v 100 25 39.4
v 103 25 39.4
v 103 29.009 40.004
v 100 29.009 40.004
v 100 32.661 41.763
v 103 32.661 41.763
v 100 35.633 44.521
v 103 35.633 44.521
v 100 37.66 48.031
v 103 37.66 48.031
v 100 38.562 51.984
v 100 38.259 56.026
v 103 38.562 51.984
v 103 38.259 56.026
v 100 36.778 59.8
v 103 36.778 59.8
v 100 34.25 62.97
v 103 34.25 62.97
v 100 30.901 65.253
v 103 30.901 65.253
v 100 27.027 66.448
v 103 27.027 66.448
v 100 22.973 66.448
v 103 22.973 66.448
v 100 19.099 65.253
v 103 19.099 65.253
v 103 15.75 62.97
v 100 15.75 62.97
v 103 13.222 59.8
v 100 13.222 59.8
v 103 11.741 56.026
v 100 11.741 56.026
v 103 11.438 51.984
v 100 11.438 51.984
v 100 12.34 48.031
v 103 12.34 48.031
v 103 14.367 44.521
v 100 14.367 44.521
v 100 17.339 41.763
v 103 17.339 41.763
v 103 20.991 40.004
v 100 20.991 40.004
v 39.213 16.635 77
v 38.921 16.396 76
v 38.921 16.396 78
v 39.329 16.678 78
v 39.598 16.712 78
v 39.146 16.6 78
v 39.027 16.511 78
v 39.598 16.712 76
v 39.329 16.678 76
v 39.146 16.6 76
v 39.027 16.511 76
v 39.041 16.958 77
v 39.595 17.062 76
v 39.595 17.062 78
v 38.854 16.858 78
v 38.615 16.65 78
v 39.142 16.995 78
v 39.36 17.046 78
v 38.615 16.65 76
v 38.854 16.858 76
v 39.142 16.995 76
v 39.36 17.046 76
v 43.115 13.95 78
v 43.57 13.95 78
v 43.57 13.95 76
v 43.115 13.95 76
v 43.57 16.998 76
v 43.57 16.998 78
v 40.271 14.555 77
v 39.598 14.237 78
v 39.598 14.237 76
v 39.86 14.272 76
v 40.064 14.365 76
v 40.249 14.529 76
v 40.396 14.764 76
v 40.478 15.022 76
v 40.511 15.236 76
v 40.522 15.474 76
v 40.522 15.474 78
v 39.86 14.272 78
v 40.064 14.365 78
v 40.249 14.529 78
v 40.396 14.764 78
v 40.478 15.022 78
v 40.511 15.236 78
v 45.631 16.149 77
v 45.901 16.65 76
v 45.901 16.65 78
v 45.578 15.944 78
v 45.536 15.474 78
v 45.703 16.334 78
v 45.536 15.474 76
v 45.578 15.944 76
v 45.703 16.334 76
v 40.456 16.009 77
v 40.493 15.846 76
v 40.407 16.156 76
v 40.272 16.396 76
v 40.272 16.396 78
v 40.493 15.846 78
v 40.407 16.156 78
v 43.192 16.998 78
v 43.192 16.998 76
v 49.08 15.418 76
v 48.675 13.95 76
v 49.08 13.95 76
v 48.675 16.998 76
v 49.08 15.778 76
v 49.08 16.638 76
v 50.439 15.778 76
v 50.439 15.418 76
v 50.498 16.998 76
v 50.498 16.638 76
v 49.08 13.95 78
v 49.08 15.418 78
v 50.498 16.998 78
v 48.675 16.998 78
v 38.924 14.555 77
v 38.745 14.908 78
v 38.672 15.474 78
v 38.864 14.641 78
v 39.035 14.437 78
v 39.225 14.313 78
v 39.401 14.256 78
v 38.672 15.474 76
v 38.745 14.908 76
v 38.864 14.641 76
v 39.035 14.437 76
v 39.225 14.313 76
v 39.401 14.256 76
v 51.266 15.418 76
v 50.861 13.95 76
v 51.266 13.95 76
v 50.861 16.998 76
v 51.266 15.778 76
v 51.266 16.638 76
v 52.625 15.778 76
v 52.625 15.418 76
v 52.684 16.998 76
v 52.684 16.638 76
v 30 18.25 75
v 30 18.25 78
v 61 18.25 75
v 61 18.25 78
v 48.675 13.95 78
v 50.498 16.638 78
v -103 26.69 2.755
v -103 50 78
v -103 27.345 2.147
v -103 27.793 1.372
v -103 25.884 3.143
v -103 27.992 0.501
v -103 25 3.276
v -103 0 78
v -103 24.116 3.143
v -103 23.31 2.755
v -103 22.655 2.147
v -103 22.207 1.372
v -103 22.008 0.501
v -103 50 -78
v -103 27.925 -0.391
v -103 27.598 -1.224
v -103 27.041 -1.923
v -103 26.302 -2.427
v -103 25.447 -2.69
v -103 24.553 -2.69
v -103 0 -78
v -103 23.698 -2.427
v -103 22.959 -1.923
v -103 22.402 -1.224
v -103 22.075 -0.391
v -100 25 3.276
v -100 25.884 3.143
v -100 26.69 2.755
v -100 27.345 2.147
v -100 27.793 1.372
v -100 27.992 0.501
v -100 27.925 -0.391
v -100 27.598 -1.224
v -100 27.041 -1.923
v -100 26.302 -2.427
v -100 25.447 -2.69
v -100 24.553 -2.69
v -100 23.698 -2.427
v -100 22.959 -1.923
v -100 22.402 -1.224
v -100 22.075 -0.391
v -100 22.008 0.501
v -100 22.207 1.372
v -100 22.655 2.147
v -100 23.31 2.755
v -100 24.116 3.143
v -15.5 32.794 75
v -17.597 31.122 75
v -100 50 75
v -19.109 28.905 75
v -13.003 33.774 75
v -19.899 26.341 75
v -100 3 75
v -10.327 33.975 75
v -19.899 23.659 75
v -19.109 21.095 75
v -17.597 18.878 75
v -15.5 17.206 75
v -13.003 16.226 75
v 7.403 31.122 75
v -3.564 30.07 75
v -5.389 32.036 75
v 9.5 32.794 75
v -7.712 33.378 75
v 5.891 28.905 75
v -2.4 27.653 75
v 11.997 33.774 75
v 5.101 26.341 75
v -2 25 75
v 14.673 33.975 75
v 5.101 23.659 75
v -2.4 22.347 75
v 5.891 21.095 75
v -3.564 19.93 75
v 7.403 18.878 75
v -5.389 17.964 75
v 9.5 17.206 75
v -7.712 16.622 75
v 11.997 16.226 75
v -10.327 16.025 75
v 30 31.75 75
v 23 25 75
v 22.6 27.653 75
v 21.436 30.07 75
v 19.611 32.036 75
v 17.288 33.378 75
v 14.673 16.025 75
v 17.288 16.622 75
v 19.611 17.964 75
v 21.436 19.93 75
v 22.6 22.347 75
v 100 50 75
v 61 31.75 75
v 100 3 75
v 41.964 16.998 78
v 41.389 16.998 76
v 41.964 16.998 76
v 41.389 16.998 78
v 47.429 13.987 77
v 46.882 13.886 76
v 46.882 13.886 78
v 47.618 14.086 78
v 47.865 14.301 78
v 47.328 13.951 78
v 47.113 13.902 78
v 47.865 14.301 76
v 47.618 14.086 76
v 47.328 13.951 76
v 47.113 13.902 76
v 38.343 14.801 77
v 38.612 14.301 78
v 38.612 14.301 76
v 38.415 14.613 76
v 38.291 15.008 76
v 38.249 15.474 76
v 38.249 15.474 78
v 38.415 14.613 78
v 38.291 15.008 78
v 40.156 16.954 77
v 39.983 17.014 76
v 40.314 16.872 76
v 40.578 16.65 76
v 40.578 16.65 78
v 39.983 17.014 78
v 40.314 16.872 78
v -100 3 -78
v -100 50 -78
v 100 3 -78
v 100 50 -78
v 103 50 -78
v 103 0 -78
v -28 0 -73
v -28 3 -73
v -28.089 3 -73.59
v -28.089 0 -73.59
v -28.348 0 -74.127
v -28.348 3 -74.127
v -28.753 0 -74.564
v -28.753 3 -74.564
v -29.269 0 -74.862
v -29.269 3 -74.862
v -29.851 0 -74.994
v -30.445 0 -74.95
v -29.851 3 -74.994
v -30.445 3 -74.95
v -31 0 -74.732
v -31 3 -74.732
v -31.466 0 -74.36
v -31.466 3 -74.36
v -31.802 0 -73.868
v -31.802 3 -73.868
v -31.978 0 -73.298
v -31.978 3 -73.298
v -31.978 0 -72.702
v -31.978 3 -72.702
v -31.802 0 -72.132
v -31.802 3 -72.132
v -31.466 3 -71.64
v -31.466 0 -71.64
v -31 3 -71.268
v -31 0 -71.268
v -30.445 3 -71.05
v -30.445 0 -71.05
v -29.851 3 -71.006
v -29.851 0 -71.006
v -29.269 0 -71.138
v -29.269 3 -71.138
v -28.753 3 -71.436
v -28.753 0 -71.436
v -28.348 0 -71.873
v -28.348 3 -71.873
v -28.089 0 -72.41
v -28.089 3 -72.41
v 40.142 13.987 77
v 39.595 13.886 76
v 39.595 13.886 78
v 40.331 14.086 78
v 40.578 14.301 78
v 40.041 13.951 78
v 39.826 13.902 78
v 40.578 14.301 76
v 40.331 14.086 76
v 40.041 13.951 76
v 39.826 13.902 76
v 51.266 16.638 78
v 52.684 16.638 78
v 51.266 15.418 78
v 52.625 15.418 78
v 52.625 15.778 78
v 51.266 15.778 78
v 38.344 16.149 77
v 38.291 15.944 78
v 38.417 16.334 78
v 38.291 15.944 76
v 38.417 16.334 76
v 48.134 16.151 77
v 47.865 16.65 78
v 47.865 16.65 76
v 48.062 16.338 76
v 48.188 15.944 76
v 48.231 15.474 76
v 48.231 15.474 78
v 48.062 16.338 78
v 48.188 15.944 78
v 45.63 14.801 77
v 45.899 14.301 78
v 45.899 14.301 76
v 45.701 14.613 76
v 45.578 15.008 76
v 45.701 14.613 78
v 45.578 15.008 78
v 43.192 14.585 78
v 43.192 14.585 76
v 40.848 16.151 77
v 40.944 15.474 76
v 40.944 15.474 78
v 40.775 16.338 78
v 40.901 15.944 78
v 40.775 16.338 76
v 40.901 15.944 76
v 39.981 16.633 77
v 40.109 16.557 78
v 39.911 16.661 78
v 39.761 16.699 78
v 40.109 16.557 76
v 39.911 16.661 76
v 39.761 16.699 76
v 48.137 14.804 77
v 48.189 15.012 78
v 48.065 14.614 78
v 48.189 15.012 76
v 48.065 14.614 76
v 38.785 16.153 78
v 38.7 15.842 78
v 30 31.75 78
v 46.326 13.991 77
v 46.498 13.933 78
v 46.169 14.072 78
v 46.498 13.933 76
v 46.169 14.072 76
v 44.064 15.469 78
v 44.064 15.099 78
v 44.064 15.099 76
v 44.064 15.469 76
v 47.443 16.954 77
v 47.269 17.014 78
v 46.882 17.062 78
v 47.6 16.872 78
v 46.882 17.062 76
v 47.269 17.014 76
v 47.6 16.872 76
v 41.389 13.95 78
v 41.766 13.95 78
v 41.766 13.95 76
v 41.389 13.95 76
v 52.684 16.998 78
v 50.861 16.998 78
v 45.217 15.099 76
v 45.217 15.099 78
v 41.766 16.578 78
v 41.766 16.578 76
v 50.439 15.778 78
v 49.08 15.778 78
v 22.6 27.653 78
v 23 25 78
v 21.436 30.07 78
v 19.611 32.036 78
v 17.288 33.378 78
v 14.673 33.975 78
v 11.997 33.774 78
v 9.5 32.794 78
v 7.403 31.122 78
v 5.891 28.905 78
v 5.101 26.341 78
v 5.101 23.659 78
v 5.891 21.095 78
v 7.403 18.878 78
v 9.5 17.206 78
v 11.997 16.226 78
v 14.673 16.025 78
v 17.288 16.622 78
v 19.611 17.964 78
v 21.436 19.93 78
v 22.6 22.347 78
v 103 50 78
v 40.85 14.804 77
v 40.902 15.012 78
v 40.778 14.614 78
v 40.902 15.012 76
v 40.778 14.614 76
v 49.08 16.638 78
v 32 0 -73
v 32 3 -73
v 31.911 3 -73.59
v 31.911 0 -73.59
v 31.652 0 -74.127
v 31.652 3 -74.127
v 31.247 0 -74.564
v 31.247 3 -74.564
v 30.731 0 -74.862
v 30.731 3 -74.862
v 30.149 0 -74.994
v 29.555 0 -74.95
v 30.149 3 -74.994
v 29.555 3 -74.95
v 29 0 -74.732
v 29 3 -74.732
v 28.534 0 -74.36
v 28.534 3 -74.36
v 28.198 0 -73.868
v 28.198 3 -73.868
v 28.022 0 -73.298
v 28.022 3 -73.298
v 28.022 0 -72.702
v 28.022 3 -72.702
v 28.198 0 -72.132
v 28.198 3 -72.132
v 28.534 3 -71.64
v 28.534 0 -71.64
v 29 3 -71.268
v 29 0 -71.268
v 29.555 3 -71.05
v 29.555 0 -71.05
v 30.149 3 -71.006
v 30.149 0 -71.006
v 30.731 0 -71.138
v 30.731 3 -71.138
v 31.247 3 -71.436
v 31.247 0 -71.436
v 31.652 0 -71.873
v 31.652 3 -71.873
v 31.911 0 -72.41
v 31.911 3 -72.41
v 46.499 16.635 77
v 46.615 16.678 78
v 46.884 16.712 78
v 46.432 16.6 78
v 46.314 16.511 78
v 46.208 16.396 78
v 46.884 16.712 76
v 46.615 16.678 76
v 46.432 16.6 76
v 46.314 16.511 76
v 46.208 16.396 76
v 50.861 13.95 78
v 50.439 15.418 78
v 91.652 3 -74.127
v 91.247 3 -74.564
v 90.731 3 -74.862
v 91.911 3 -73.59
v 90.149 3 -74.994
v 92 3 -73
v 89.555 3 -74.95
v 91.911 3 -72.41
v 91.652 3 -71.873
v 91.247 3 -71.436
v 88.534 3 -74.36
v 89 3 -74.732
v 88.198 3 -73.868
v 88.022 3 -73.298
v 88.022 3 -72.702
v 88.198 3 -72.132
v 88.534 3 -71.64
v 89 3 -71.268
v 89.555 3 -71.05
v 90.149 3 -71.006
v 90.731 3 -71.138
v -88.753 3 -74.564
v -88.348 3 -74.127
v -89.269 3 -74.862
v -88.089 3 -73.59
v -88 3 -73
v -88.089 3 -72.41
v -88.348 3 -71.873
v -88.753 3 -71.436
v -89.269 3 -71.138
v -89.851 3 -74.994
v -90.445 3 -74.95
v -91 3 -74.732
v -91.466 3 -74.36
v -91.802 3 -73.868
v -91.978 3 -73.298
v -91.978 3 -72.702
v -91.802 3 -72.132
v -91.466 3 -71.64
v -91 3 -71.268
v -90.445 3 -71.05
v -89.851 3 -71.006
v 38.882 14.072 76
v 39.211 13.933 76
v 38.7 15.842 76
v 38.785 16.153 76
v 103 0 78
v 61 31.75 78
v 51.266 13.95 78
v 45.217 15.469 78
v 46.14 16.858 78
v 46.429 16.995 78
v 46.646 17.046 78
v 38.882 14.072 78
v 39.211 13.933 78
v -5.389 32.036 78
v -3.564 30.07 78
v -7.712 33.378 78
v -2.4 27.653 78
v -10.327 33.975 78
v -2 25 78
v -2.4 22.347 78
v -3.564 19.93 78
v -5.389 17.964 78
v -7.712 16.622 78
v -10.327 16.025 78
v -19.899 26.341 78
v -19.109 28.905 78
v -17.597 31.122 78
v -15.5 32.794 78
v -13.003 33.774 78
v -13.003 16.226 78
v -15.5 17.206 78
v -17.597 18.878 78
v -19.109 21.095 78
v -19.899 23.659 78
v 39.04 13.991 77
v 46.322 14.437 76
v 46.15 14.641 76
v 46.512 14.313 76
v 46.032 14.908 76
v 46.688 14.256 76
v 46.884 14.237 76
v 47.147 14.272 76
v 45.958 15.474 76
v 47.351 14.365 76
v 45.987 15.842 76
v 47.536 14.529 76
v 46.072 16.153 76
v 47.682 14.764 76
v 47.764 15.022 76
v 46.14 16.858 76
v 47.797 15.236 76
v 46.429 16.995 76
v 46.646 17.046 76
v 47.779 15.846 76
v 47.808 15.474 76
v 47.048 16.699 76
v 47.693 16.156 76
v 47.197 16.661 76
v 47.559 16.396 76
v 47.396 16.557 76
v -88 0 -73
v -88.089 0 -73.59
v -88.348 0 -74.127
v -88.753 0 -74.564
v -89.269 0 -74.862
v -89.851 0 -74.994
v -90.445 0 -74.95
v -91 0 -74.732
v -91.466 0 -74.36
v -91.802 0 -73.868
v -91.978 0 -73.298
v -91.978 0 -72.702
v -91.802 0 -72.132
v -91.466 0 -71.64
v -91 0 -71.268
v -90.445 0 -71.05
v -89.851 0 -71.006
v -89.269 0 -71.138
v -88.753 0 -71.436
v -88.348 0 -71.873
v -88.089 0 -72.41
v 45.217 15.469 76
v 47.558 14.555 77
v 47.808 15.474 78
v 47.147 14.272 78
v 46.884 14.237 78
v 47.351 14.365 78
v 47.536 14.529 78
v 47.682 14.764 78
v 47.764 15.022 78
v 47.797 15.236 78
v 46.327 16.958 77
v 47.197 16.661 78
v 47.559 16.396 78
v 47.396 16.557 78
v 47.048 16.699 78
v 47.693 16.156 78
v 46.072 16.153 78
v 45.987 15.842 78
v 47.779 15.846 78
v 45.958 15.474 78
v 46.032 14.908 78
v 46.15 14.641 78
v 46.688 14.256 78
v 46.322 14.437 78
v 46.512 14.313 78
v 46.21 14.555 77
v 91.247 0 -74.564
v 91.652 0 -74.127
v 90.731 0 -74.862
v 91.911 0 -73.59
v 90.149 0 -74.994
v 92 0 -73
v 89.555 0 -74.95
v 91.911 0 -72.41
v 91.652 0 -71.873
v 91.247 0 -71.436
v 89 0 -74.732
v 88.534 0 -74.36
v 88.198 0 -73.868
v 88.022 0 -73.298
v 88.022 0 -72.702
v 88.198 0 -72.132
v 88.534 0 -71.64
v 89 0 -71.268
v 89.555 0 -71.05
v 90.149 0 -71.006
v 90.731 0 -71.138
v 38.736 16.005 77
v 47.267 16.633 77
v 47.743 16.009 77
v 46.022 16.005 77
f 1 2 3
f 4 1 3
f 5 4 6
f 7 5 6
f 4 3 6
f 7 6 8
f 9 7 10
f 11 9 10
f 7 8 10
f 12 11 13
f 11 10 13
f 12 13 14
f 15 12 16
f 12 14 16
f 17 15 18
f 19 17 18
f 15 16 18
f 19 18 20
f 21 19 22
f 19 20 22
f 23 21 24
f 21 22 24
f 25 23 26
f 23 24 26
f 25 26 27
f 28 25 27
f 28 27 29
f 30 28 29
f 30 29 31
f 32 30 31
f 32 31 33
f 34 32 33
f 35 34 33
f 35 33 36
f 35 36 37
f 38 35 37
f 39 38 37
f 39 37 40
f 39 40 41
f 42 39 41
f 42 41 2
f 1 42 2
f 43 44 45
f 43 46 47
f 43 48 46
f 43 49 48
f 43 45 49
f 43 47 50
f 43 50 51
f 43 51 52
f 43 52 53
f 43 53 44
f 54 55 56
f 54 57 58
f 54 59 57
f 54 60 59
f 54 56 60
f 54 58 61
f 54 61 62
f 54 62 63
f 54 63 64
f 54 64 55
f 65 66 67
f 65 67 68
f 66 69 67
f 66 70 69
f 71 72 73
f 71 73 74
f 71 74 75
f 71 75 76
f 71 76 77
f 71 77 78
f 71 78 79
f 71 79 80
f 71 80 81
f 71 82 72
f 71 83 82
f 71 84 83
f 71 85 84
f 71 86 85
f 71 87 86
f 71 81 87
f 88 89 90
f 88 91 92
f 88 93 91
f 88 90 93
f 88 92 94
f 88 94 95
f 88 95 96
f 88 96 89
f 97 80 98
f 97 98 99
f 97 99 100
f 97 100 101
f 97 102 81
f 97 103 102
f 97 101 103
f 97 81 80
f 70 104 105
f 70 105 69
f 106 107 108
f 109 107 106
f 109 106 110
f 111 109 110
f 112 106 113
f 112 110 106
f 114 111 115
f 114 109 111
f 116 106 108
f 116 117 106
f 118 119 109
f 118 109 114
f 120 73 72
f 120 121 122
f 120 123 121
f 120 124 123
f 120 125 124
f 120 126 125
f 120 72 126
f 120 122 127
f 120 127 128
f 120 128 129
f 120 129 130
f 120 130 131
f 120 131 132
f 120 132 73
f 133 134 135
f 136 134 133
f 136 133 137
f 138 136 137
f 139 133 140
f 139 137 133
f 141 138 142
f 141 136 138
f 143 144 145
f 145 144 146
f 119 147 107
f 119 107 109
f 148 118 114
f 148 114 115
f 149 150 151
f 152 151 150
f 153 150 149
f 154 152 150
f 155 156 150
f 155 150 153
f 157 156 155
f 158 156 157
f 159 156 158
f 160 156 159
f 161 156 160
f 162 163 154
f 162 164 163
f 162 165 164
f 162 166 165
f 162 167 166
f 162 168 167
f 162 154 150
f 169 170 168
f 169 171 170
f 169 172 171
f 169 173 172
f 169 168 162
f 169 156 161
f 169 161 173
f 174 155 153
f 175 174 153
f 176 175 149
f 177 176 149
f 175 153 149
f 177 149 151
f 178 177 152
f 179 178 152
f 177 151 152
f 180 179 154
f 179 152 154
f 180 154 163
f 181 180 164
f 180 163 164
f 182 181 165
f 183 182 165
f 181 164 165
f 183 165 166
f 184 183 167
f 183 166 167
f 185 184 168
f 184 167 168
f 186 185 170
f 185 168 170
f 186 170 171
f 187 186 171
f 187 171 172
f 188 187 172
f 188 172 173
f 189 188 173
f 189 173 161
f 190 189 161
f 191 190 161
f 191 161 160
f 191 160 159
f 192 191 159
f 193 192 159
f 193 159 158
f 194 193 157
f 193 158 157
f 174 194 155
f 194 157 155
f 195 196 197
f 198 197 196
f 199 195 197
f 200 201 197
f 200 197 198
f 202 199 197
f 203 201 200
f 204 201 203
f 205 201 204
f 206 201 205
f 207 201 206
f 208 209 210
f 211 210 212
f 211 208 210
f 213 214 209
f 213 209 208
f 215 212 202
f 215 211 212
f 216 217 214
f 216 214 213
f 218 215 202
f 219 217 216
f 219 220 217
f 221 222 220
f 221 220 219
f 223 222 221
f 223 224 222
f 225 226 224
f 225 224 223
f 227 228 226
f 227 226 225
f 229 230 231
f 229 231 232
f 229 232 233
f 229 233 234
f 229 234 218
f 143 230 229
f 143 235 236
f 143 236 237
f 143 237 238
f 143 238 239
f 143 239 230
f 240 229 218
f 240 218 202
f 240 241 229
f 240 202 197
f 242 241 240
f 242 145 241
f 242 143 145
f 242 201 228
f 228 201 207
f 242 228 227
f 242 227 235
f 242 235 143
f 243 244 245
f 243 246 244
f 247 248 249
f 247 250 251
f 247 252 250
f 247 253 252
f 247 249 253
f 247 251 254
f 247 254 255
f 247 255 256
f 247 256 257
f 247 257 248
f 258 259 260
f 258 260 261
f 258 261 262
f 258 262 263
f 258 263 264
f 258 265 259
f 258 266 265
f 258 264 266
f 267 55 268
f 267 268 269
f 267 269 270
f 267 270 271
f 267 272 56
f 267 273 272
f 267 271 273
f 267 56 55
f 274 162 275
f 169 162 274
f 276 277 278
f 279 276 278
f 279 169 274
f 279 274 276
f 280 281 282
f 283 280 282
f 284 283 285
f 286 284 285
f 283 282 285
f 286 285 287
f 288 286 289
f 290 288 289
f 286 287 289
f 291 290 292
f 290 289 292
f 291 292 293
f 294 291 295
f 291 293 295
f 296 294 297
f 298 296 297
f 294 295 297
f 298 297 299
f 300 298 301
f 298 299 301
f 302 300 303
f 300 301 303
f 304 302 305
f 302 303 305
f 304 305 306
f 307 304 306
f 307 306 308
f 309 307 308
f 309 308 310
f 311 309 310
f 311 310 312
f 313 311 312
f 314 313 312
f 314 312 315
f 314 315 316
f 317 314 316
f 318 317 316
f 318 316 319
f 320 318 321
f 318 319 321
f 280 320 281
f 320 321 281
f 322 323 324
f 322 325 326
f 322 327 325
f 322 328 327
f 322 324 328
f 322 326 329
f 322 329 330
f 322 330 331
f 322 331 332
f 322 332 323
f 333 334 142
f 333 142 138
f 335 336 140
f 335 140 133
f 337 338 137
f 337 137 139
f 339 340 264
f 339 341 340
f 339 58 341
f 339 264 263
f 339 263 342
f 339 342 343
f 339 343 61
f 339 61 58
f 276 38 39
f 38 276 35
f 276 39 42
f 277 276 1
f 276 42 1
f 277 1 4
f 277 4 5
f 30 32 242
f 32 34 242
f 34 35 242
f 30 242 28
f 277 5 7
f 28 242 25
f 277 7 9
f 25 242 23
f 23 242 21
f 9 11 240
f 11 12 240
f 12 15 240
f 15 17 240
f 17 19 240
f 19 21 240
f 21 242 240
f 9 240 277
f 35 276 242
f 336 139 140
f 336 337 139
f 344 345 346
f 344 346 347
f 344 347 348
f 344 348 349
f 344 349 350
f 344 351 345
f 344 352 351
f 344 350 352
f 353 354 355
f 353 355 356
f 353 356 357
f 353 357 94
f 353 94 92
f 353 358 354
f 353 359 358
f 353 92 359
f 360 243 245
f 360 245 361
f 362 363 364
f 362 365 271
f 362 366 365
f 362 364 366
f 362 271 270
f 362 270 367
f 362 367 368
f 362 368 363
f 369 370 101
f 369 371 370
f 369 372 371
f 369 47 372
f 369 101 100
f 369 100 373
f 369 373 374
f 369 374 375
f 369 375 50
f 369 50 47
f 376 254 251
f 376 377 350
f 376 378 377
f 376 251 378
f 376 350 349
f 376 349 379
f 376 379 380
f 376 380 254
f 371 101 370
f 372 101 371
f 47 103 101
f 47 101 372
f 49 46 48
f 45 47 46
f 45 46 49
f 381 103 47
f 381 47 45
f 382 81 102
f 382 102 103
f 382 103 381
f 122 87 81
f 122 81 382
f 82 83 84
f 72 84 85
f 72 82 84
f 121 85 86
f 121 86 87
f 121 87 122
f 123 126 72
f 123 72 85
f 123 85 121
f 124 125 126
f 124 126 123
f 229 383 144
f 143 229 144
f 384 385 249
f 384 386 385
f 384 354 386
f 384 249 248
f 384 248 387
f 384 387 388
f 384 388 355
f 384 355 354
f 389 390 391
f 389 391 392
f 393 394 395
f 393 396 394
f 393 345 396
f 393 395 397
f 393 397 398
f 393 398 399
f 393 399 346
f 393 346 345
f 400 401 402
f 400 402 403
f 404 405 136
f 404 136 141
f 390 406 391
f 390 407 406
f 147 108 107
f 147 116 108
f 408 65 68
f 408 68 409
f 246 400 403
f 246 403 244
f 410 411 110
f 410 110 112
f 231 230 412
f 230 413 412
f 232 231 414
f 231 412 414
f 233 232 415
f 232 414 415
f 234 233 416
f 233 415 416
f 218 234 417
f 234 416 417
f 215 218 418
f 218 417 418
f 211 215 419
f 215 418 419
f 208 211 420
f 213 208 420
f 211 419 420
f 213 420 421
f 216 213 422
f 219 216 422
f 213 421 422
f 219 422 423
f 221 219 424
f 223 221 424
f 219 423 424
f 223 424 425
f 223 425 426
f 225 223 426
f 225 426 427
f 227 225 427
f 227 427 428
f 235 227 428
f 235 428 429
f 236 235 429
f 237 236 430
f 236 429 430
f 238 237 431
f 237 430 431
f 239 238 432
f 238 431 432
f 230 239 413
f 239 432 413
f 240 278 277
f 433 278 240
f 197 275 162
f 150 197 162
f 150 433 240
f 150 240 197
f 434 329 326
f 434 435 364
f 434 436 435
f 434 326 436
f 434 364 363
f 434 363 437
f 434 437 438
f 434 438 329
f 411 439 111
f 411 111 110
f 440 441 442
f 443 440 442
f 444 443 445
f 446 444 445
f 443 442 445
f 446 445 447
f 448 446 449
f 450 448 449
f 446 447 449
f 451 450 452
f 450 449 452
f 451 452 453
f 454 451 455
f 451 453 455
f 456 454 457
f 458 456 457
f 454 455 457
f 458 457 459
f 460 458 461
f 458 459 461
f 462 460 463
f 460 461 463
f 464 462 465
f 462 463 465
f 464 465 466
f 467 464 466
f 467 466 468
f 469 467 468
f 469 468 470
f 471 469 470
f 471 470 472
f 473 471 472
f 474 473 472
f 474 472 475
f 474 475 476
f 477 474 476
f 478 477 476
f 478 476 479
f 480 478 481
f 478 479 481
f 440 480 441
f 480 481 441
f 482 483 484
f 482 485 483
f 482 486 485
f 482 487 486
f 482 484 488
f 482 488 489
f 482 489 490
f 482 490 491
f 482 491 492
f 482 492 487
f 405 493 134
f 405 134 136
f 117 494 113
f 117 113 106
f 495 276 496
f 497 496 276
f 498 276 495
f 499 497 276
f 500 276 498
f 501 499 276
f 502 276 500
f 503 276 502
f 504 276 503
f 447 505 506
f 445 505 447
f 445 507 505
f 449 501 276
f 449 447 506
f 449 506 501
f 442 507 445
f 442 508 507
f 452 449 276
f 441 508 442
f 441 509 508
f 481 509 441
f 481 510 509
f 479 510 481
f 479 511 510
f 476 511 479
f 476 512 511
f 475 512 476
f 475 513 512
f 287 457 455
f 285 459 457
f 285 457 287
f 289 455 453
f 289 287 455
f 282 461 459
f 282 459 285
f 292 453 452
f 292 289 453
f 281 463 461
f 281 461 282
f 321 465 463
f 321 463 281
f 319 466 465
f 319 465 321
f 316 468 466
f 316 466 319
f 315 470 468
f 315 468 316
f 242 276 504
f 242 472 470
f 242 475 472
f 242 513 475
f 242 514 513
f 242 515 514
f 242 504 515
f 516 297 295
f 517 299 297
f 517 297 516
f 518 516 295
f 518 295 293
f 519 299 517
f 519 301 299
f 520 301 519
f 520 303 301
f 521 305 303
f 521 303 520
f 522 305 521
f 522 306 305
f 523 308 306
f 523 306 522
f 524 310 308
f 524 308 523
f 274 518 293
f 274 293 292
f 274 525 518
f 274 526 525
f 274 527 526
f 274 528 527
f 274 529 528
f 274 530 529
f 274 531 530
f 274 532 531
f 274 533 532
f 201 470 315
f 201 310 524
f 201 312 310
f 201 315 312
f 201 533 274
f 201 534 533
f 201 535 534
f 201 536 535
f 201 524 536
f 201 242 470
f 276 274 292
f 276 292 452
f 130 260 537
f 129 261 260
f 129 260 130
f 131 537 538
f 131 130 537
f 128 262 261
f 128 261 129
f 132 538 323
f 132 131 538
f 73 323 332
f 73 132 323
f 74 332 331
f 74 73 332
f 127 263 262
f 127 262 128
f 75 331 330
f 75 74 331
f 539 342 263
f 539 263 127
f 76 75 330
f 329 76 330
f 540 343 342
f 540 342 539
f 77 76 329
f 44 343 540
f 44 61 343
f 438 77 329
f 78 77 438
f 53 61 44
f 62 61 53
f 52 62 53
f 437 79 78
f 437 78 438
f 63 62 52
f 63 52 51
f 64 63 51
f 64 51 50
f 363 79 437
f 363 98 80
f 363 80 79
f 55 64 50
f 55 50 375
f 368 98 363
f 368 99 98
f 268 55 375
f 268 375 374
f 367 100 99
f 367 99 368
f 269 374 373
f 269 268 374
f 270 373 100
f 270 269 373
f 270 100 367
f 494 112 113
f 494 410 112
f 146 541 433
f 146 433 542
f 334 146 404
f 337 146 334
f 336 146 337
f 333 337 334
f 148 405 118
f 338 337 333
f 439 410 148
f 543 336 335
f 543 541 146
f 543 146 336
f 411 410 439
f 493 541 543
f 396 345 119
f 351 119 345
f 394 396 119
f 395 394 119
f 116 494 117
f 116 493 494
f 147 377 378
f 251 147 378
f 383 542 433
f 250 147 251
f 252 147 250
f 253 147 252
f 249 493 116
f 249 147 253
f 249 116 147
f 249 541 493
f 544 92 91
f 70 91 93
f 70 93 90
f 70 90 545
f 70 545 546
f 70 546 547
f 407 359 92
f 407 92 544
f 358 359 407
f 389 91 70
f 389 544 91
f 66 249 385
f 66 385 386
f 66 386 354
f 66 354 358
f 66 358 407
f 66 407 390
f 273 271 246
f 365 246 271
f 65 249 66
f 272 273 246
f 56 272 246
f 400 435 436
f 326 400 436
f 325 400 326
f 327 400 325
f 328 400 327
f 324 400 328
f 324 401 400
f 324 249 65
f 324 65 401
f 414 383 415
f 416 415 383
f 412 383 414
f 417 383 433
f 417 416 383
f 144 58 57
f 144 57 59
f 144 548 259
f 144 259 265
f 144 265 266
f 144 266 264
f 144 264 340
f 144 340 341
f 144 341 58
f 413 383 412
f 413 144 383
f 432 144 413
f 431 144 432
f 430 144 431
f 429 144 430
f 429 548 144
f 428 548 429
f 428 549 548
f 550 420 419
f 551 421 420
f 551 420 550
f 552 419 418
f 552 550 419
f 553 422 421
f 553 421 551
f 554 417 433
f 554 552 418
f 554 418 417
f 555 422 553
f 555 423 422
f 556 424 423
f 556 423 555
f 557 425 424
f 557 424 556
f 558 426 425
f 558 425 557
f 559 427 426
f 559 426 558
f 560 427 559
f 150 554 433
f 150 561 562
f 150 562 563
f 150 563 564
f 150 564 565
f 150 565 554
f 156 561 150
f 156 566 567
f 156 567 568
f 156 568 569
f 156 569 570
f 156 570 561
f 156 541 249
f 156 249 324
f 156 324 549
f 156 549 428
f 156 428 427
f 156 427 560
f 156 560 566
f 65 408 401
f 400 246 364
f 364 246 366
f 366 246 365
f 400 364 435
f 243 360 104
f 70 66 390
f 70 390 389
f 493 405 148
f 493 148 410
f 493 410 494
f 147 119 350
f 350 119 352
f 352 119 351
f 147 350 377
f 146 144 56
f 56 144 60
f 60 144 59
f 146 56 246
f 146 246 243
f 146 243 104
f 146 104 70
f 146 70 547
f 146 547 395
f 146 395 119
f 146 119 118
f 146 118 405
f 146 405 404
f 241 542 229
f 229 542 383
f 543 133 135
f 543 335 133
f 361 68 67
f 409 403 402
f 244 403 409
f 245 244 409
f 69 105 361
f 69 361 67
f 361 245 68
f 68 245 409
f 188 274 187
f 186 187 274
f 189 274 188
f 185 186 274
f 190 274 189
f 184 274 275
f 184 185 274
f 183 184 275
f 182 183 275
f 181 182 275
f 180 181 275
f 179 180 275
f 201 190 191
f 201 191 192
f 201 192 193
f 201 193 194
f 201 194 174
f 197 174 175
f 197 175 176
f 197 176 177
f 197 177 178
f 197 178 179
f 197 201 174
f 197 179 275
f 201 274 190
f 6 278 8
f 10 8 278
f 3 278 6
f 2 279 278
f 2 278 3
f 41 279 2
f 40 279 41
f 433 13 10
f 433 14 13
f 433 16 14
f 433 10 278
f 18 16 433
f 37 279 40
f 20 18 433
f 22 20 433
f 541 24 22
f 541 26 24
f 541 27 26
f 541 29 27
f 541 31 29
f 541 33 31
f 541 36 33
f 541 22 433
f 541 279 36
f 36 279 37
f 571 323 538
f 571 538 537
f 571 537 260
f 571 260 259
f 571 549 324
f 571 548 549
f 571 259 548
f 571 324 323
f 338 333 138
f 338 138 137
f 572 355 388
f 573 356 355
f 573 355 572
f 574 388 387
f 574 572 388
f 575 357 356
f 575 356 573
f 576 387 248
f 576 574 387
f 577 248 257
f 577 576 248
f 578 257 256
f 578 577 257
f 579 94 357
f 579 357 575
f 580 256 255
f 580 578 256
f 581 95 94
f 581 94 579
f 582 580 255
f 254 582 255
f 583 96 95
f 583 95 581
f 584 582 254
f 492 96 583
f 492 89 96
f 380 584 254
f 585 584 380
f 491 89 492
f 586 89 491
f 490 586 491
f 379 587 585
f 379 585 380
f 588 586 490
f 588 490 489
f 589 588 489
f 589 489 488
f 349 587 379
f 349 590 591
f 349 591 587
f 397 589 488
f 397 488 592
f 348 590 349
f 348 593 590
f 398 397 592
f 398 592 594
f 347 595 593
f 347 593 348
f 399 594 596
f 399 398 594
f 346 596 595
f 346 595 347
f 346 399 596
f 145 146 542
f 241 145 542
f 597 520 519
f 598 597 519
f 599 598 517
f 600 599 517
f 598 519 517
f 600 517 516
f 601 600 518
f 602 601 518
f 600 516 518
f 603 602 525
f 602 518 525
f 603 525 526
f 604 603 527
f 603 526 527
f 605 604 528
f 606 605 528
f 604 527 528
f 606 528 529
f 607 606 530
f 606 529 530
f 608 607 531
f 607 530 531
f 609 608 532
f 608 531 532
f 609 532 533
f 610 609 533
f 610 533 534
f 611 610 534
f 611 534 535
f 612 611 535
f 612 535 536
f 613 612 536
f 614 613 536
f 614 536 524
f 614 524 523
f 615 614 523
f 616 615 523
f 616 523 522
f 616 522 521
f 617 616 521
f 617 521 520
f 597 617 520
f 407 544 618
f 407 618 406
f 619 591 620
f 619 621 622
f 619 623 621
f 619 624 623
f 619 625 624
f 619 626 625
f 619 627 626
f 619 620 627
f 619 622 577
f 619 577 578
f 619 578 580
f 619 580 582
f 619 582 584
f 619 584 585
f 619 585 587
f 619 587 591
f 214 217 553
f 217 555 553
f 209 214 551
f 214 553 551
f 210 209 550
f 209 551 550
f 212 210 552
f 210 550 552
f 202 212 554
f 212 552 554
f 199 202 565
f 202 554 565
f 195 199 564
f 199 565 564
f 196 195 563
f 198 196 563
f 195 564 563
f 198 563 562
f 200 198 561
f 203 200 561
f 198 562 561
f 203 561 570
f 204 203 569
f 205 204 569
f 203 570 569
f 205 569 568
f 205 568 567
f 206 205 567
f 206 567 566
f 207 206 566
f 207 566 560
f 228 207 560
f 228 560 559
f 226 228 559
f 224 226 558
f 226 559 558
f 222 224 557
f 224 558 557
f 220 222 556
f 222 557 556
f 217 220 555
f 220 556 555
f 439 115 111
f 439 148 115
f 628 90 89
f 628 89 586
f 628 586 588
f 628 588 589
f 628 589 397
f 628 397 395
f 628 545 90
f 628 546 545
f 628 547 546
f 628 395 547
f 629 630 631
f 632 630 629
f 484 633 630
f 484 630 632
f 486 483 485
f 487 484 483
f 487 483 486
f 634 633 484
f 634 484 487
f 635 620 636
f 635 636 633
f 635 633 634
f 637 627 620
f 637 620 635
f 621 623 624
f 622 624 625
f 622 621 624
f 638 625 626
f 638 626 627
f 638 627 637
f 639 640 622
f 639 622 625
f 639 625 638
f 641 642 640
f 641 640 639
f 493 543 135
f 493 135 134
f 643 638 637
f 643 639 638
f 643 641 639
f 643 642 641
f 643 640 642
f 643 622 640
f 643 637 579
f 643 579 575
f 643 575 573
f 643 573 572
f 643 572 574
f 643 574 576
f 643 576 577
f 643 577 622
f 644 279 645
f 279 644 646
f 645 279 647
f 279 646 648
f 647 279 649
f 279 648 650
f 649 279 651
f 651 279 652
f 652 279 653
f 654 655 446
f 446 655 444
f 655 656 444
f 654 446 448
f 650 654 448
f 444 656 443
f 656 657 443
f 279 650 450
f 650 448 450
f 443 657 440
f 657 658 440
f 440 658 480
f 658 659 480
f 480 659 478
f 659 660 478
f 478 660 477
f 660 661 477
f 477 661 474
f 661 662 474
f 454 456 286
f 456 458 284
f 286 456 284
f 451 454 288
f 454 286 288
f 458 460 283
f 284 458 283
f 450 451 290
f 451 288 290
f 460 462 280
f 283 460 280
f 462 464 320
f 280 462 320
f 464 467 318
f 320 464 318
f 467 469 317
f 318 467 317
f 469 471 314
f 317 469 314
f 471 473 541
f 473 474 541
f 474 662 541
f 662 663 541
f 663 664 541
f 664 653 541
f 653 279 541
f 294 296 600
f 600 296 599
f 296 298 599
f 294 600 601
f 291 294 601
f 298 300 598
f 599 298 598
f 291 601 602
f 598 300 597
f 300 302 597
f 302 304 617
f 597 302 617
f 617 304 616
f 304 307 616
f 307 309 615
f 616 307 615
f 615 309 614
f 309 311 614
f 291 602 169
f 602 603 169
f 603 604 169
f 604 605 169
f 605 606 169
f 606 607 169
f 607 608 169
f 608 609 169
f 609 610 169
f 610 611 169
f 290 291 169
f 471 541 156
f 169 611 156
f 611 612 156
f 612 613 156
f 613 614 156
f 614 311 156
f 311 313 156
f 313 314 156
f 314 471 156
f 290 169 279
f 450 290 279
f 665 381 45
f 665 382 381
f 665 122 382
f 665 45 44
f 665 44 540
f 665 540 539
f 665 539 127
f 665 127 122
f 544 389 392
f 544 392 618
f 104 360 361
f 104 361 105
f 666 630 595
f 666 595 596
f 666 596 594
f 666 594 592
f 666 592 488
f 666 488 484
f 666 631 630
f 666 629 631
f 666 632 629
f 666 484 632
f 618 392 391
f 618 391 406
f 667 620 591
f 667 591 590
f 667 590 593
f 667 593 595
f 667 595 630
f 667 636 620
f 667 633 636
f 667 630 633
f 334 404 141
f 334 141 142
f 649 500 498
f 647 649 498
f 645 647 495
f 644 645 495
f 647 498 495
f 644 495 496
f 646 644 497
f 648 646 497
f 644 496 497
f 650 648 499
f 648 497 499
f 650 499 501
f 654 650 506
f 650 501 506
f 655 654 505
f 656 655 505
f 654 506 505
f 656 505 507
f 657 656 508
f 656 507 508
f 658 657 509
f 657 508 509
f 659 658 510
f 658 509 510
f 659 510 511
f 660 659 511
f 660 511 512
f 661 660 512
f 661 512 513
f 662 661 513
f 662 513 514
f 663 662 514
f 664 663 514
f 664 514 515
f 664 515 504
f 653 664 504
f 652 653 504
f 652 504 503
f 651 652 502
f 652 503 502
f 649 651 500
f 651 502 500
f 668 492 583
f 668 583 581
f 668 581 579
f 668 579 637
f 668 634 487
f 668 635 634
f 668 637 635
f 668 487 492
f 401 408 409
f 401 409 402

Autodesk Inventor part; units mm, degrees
ref_plane "YZ Plane" through (0, 0, 0) normal (1, 0, 0) x (0, 1, 0)
ref_plane "XZ Plane" through (0, 0, 0) normal (0, 1, 0) x (-1, 0, 0)
ref_plane "XY Plane" through (0, 0, 0) normal (0, 0, 1) x (1, 0, 0)
sketch "Boceto1" plane through (0, 0, 0) normal (0, 1, 0) x (-1, 0, 0)
  line L0 (-100, 75) -> (100, 75)
  line L1 (100, 75) -> (100, -75)
  line L2 (100, -75) -> (-100, -75)
  line L3 (-100, -75) -> (-100, 75)
  line L4 (-100, 75) -> (100, -75) construction
  line L5 (100, 75) -> (-100, -75) construction
  point P0 (0, 0)
  dimension "d0" = 200
  dimension "d1" = 150
extrude "Extrusión1" add sketch "Boceto1" along normal blind 3
sketch "Boceto2" plane through (0, 0, 0) normal (0, 1, 0) x (-1, 0, 0)
  line L0 (-100, -75) -> (100, -75) projected
  line L1 (100, -75) -> (100, 75) projected
  line L2 (100, 75) -> (-100, 75) projected
  line L3 (-100, 75) -> (-100, -75) projected
  line L4 (103, 78) -> (103, -78)
  line L5 (103, -78) -> (-103, -78)
  line L6 (-103, -78) -> (-103, 78)
  line L7 (-103, 78) -> (103, 78)
  point P0 (0, 0)
  dimension "d4" = 3
extrude "Extrusión2" add sketch "Boceto2" along normal blind 50
sketch "Boceto3" plane through (-103, 0, -78) normal (-1, 0, 0) x (0, 0, 1)
  line L0 (78, 0) -> (78, 50) construction
  line L1 (3, 50) -> (153, 50) construction
  line L2 (156, 0) -> (156, 50) construction
  line L3 (156, 25) -> (0.5528, 25) construction
  circle A0 centre (78.2764, 25) radius 3
  line L4 (0, 0) -> (156, 0) projected
  line L5 (156, 0) -> (156, 50) projected
  line L6 (0, 50) -> (156, 50) projected
  line L7 (0, 0) -> (0, 50) projected
  line L8 (0, 0) -> (156, 0) projected
  dimension "d7" = 6
  dimension "d11" = 25
extrude "Extrusión3" cut sketch "Boceto3" against normal blind 3 contours A0
sketch "Boceto4" plane through (-103, 0, 78) normal (0, 0, 1) x (1, 0, 0)
  line L0 (0, 0) -> (206, 0) projected
  line L1 (0, 25) -> (206, 25)
  circle A0 centre (92, 25) radius 9
  circle A1 centre (117, 25) radius 9
  line L2 (133, 18.25) -> (164, 18.25)
  line L3 (164, 18.25) -> (164, 31.75)
  line L4 (164, 31.75) -> (133, 31.75)
  line L5 (133, 31.75) -> (133, 18.25)
  line L6 (133, 18.25) -> (164, 31.75) construction
  line L7 (164, 18.25) -> (133, 31.75) construction
  line L8 (206, 0) -> (206, 50) projected
  line L9 (141.1134, 17.0625) -> (155.7384, 17.0625) construction
  line L10 (155.7384, 17.0625) -> (155.7384, 13.8861) construction
  line L11 (155.7384, 13.8861) -> (141.1134, 13.8861) construction
  line L12 (141.1134, 13.8861) -> (141.1134, 17.0625) construction
  spline S0 degree 2 poles (143.5785, 16.6501) (143.7514, 16.4475) (143.944, 15.8547) (143.944, 15.4743) knots 0 0 0 1 2 2 2
  spline S1 degree 2 poles (143.944, 15.4743) (143.944, 15.1038) (143.7563, 14.5036) (143.5785, 14.3011) knots 0 0 0 1 2 2 2
  spline S2 degree 2 poles (143.5785, 14.3011) (143.3907, 14.0886) (142.8943, 13.8861) (142.5954, 13.8861) knots 0 0 0 1 2 2 2
  spline S3 degree 2 poles (142.5954, 13.8861) (142.2866, 13.8861) (141.7926, 14.0961) (141.6123, 14.3011) knots 0 0 0 1 2 2 2
  spline S4 degree 2 poles (141.6123, 14.3011) (141.437, 14.5036) (141.2492, 15.0989) (141.2492, 15.4743) knots 0 0 0 1 2 2 2
  spline S5 degree 2 poles (141.2492, 15.4743) (141.2492, 15.8572) (141.4394, 16.4401) (141.6148, 16.6501) knots 0 0 0 1 2 2 2
  spline S6 degree 2 poles (141.6148, 16.6501) (141.7926, 16.8526) (142.2891, 17.0625) (142.5954, 17.0625) knots 0 0 0 1 2 2 2
  spline S7 degree 2 poles (142.5954, 17.0625) (142.9066, 17.0625) (143.4056, 16.8452) (143.5785, 16.6501) knots 0 0 0 1 2 2 2
  spline S8 degree 2 poles (143.5217, 15.4743) (143.5217, 15.7757) (143.3907, 16.2425) (143.2722, 16.3956) knots 0 0 0 1 2 2 2
  spline S9 degree 2 poles (143.2722, 16.3956) (143.1511, 16.5537) (142.8103, 16.7118) (142.5979, 16.7118) knots 0 0 0 1 2 2 2
  spline S10 degree 2 poles (142.5979, 16.7118) (142.378, 16.7118) (142.0471, 16.5587) (141.9211, 16.3956) knots 0 0 0 1 2 2 2
  spline S11 degree 2 poles (141.9211, 16.3956) (141.8, 16.24) (141.6716, 15.7707) (141.6716, 15.4743) knots 0 0 0 1 2 2 2
  spline S12 degree 2 poles (141.6716, 15.4743) (141.6716, 14.8741) (142.1755, 14.2368) (142.5979, 14.2368) knots 0 0 0 1 2 2 2
  spline S13 degree 2 poles (142.5979, 14.2368) (143.0202, 14.2368) (143.5217, 14.8741) (143.5217, 15.4743) knots 0 0 0 1 2 2 2
  line L13 (146.5697, 13.9503) -> (146.1152, 13.9503)
  line L14 (146.1152, 13.9503) -> (144.7665, 16.5784)
  line L15 (144.7665, 16.5784) -> (144.7665, 13.9503)
  line L16 (144.7665, 13.9503) -> (144.3886, 13.9503)
  line L17 (144.3886, 13.9503) -> (144.3886, 16.9983)
  line L18 (144.3886, 16.9983) -> (144.9641, 16.9983)
  line L19 (144.9641, 16.9983) -> (146.1917, 14.5851)
  line L20 (146.1917, 14.5851) -> (146.1917, 16.9983)
  line L21 (146.1917, 16.9983) -> (146.5697, 16.9983)
  line L22 (146.5697, 16.9983) -> (146.5697, 13.9503)
  line L23 (148.2172, 15.0989) -> (147.0637, 15.0989)
  line L24 (147.0637, 15.0989) -> (147.0637, 15.4694)
  line L25 (147.0637, 15.4694) -> (148.2172, 15.4694)
  line L26 (148.2172, 15.4694) -> (148.2172, 15.0989)
  spline S14 degree 2 poles (150.865, 16.6501) (151.0379, 16.4475) (151.2306, 15.8547) (151.2306, 15.4743) knots 0 0 0 1 2 2 2
  spline S15 degree 2 poles (151.2306, 15.4743) (151.2306, 15.1038) (151.0428, 14.5036) (150.865, 14.3011) knots 0 0 0 1 2 2 2
  spline S16 degree 2 poles (150.865, 14.3011) (150.6773, 14.0886) (150.1808, 13.8861) (149.8819, 13.8861) knots 0 0 0 1 2 2 2
  spline S17 degree 2 poles (149.8819, 13.8861) (149.5732, 13.8861) (149.0792, 14.0961) (148.8989, 14.3011) knots 0 0 0 1 2 2 2
  spline S18 degree 2 poles (148.8989, 14.3011) (148.7235, 14.5036) (148.5358, 15.0989) (148.5358, 15.4743) knots 0 0 0 1 2 2 2
  spline S19 degree 2 poles (148.5358, 15.4743) (148.5358, 15.8572) (148.726, 16.4401) (148.9013, 16.6501) knots 0 0 0 1 2 2 2
  spline S20 degree 2 poles (148.9013, 16.6501) (149.0792, 16.8526) (149.5757, 17.0625) (149.8819, 17.0625) knots 0 0 0 1 2 2 2
  spline S21 degree 2 poles (149.8819, 17.0625) (150.1932, 17.0625) (150.6921, 16.8452) (150.865, 16.6501) knots 0 0 0 1 2 2 2
  spline S22 degree 2 poles (150.8082, 15.4743) (150.8082, 15.7757) (150.6773, 16.2425) (150.5587, 16.3956) knots 0 0 0 1 2 2 2
  spline S23 degree 2 poles (150.5587, 16.3956) (150.4377, 16.5537) (150.0968, 16.7118) (149.8844, 16.7118) knots 0 0 0 1 2 2 2
  spline S24 degree 2 poles (149.8844, 16.7118) (149.6646, 16.7118) (149.3336, 16.5587) (149.2076, 16.3956) knots 0 0 0 1 2 2 2
  spline S25 degree 2 poles (149.2076, 16.3956) (149.0866, 16.24) (148.9582, 15.7707) (148.9582, 15.4743) knots 0 0 0 1 2 2 2
  spline S26 degree 2 poles (148.9582, 15.4743) (148.9582, 14.8741) (149.462, 14.2368) (149.8844, 14.2368) knots 0 0 0 1 2 2 2
  spline S27 degree 2 poles (149.8844, 14.2368) (150.3068, 14.2368) (150.8082, 14.8741) (150.8082, 15.4743) knots 0 0 0 1 2 2 2
  line L27 (153.498, 16.6377) -> (152.0803, 16.6377)
  line L28 (152.0803, 16.6377) -> (152.0803, 15.7781)
  line L29 (152.0803, 15.7781) -> (153.4388, 15.7781)
  line L30 (153.4388, 15.7781) -> (153.4388, 15.4175)
  line L31 (153.4388, 15.4175) -> (152.0803, 15.4175)
  line L32 (152.0803, 15.4175) -> (152.0803, 13.9503)
  line L33 (152.0803, 13.9503) -> (151.6752, 13.9503)
  line L34 (151.6752, 13.9503) -> (151.6752, 16.9983)
  line L35 (151.6752, 16.9983) -> (153.498, 16.9983)
  line L36 (153.498, 16.9983) -> (153.498, 16.6377)
  line L37 (155.684, 16.6377) -> (154.2662, 16.6377)
  line L38 (154.2662, 16.6377) -> (154.2662, 15.7781)
  line L39 (154.2662, 15.7781) -> (155.6247, 15.7781)
  line L40 (155.6247, 15.7781) -> (155.6247, 15.4175)
  line L41 (155.6247, 15.4175) -> (154.2662, 15.4175)
  line L42 (154.2662, 15.4175) -> (154.2662, 13.9503)
  line L43 (154.2662, 13.9503) -> (153.8611, 13.9503)
  line L44 (153.8611, 13.9503) -> (153.8611, 16.9983)
  line L45 (153.8611, 16.9983) -> (155.684, 16.9983)
  line L46 (155.684, 16.9983) -> (155.684, 16.6377)
  point P0 (103, 0)
  point P1 (148.5, 25)
  dimension "d0" = 200
  dimension "d1" = 150
  dimension "d10" = 25
  dimension "d12" = 18
  dimension "d13" = 18
  dimension "d14" = 31
  dimension "d15" = 13.5
  dimension "d16" = 42
  dimension "d17" = 25
  dimension "d18" = 16
extrude "Extrusión4" cut sketch "Boceto4" against normal blind 25 contours A0 L1 | L5 L4 L3 L1 | L1 L3 L2 L5 | A1 L1 | L1 A1 | L1 A0
extrude "Extrusión5" cut sketch "Boceto4" against normal blind 2 contours S0 S1 S2 S3 S4 S5 S6 S7 | L13 L14 L15 L16 L17 L18 L19 L20 L21 L22 | L23 L24 L25 L26 | S14 S15 S16 S17 S18 S19 S20 S21 | L27 L28 L29 L30 L31 L32 L33 L34 L35 L36 | L37 L38 L39 L40 L41 L42 L43 L44 L45 L46
sketch "Boceto5" plane through (-100, 3, -75) normal (0, 0, 1) x (1, 0, 0)
  line L0 (200, 0) -> (0, 0) projected
  line L1 (200, 0) -> (200, 47) projected
  line L2 (0, 47) -> (200, 47) projected
  line L3 (0, 0) -> (0, 47) projected
  point P0 (100, -3)
extrude "Extrusión6" cut sketch "Boceto5" against normal blind 3
sketch "Boceto6" plane through (0, 3, 0) normal (0, 1, 0) x (1, 0, 0)
  line L0 (-100, 78) -> (100, 78) projected
  line L1 (-100, 73) -> (100, 73) construction
  circle A0 centre (-90, 73) radius 2
  line L2 (-100, -75) -> (-100, 78) projected
  circle A1 centre (-30, 73) radius 2
  circle A2 centre (30, 73) radius 2
  circle A3 centre (90, 73) radius 2
  point P0 (0, 0)
  dimension "d25" = 5
  dimension "d26" = 4
  dimension "d27" = 10
  dimension "d30" = 60
extrude "Extrusión7" cut sketch "Boceto6" against normal blind 3
sketch "Boceto7" plane through (103, 0, 78) normal (1, 0, 0) x (0, 0, -1)
  line L0 (-0.5059, 25) -> (155.9287, 25) construction
  line L1 (156, 50) -> (3, 50) construction
  line L2 (25, 50) -> (25, 0) construction
  line L3 (0, 0) -> (0, 50) construction
  circle A0 centre (25, 25) radius 13.6
  point P0 (78, 0)
  dimension "d37" = 25
  dimension "d38" = 27.2
extrude "Extrusión8" cut sketch "Boceto7" against normal blind 3
equation "\"d19\" = d17"
properties part number "Chasis"
